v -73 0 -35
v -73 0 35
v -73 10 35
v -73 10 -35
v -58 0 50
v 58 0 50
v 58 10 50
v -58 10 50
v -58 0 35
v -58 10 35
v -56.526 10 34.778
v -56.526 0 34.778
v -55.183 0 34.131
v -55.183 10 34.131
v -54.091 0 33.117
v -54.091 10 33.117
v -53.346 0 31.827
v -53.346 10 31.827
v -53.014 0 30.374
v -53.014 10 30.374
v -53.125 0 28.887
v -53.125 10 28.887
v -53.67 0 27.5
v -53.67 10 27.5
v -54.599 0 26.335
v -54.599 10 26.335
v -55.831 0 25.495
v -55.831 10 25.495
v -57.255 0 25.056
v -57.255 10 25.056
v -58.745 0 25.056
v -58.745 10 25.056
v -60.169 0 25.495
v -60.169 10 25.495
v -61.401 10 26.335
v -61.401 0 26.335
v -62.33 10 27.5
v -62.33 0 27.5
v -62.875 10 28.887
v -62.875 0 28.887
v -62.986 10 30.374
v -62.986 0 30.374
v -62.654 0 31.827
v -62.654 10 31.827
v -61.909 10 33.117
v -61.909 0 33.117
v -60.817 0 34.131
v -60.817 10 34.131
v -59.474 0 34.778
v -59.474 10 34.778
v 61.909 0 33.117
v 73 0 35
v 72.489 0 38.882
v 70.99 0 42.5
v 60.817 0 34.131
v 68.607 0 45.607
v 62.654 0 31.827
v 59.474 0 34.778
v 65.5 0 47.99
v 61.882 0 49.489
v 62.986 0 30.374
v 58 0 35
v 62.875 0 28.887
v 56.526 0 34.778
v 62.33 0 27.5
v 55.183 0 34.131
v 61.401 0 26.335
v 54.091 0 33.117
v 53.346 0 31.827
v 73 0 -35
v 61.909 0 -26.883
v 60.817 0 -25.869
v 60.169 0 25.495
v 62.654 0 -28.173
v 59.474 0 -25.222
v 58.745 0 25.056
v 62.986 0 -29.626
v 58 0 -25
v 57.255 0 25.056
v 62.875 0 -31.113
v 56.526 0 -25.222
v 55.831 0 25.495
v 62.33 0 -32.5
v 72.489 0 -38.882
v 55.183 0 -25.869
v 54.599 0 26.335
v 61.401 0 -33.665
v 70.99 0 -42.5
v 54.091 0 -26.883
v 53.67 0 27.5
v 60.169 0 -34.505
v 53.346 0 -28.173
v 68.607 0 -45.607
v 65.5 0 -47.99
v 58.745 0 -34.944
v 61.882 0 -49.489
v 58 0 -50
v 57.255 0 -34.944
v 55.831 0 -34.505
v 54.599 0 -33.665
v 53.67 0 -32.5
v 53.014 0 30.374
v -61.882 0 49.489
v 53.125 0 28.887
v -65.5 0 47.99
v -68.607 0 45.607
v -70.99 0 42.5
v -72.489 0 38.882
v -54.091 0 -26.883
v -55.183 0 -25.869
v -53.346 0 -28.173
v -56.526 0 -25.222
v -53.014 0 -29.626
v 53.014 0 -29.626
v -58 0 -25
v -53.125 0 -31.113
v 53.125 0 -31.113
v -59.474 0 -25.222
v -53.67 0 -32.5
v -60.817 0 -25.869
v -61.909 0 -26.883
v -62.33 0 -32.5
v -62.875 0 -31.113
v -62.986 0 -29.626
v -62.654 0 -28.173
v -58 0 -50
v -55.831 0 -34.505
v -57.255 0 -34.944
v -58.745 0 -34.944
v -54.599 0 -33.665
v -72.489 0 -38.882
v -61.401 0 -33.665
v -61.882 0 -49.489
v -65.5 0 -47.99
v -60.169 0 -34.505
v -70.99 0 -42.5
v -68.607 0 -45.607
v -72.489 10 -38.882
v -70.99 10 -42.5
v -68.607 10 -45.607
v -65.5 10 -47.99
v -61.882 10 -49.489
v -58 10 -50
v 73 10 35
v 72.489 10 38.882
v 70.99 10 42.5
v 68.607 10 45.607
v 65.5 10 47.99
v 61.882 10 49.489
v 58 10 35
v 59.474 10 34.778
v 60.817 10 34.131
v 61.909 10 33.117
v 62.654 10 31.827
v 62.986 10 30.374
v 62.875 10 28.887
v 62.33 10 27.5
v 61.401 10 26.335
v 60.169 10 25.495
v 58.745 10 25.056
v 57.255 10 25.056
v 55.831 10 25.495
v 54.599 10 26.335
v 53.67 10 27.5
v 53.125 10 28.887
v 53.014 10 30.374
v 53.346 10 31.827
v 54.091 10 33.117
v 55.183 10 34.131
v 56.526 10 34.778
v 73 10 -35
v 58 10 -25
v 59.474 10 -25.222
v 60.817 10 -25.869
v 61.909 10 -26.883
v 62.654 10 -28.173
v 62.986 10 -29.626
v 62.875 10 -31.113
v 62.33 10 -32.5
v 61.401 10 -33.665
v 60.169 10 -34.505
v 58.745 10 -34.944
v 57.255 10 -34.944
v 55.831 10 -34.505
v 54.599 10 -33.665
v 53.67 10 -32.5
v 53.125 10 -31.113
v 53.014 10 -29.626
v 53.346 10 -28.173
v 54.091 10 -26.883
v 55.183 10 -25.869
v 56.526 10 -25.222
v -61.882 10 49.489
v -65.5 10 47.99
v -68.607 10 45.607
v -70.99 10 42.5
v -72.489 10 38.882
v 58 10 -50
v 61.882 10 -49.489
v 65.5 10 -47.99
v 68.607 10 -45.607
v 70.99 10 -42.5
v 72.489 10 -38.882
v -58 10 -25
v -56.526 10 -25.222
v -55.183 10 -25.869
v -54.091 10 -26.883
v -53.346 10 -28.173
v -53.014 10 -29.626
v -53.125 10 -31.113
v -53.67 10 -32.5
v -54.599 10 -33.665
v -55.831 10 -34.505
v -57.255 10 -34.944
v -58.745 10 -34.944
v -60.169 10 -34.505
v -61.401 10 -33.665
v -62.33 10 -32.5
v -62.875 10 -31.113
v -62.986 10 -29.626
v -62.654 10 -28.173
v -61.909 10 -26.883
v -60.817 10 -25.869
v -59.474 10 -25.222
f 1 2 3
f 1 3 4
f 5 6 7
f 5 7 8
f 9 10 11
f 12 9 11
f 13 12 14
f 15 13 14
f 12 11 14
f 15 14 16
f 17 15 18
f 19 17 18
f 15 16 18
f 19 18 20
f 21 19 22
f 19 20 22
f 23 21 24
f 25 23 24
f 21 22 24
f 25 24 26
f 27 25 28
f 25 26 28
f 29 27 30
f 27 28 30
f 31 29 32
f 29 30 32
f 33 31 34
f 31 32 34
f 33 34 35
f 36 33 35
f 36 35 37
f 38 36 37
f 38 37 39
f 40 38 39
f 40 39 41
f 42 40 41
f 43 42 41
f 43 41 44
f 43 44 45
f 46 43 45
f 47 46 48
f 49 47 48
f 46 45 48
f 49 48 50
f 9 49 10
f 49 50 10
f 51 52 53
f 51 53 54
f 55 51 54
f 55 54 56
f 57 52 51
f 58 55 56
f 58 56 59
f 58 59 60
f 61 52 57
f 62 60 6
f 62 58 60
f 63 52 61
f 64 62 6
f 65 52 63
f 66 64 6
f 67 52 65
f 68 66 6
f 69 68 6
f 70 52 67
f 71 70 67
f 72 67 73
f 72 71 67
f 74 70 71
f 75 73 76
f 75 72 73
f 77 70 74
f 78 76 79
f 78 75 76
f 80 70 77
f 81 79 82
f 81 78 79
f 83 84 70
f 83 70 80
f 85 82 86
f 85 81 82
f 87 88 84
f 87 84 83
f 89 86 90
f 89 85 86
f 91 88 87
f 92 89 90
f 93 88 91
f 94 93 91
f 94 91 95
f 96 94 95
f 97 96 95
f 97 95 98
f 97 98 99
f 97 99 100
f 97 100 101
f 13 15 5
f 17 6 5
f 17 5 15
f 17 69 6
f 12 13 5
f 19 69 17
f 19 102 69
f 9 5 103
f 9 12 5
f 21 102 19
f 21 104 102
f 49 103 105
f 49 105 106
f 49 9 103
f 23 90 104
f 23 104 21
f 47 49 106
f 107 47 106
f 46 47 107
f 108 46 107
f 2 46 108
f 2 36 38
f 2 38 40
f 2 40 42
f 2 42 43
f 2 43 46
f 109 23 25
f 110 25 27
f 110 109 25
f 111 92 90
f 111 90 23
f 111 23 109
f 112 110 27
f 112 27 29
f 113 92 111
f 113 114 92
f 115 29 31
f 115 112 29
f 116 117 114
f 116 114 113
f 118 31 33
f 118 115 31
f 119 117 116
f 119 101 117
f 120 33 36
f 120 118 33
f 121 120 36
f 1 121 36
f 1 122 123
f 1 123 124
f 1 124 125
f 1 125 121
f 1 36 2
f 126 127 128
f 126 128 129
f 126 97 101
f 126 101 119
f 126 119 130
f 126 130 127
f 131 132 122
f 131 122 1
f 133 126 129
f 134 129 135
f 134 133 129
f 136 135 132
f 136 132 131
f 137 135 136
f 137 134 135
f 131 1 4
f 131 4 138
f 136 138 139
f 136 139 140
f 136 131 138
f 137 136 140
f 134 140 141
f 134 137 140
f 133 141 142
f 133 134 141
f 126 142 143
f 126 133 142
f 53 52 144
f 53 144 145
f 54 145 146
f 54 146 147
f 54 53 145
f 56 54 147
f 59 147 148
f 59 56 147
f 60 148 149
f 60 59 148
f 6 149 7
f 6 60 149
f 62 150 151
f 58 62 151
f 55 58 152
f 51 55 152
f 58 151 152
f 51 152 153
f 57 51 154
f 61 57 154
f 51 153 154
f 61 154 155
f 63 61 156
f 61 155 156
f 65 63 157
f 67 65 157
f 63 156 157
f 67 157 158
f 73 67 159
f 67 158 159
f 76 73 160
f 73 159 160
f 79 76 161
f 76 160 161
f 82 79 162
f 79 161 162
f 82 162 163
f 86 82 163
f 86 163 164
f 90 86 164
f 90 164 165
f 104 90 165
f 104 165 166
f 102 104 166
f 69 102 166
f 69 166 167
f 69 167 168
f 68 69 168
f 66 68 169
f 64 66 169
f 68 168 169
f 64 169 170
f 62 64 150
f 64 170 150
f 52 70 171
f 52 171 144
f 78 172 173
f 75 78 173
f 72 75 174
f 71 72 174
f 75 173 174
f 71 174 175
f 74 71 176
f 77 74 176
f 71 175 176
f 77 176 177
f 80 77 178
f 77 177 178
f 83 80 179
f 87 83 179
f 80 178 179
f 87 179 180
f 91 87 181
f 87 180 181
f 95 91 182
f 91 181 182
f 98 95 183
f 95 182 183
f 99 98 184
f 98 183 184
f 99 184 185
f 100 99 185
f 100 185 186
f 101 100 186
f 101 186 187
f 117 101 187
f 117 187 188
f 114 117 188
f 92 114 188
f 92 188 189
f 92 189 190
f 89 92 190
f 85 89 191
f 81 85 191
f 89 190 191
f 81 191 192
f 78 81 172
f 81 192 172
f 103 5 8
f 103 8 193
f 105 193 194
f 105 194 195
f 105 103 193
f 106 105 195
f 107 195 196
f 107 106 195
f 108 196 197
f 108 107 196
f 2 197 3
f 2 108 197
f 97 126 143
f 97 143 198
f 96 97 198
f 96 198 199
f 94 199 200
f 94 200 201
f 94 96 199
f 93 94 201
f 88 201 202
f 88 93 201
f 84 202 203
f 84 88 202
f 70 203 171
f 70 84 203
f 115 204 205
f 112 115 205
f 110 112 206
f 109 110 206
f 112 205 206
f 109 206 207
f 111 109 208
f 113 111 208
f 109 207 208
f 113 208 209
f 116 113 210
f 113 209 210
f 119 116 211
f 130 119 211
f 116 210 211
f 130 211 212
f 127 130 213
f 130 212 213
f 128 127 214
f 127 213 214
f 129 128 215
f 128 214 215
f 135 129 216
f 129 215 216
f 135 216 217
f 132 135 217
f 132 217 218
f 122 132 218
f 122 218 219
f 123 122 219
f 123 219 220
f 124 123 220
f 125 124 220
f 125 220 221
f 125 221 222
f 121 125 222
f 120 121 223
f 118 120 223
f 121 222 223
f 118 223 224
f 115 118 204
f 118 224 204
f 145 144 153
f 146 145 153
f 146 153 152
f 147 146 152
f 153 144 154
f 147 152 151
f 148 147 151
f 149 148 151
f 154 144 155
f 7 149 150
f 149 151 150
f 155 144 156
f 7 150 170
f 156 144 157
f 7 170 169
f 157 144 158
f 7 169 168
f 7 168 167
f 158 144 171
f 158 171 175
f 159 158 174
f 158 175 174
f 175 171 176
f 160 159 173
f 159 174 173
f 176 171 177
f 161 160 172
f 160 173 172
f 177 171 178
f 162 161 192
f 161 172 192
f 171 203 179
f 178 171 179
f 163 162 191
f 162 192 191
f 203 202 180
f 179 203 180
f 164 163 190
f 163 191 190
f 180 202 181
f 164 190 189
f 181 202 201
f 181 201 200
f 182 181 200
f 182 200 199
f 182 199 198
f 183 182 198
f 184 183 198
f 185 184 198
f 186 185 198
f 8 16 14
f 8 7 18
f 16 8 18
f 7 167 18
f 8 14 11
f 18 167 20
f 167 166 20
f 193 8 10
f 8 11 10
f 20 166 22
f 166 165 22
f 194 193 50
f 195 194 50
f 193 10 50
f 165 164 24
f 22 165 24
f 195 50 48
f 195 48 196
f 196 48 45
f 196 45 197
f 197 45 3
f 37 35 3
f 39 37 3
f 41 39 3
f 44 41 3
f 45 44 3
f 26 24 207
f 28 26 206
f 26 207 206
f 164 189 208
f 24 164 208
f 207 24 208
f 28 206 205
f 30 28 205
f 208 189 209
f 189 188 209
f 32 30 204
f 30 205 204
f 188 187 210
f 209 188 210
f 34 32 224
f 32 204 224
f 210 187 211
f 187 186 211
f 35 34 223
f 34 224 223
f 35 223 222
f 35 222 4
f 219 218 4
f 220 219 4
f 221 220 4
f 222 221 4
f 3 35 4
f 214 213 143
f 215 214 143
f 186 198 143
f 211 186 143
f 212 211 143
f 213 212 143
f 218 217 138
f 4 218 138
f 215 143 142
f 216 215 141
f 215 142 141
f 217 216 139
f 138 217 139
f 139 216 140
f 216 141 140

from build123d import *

# Parameters (mm, degrees)
SALIENTE_EXTRUIR1_DEPTH  = 10
CROQUIS2_R               = 5
CORTAR_EXTRUIR1_DEPTH    = 10
MATRIZL1_COUNT           = 3
MATRIZL1_PITCH           = 116
MATRIZL2_COUNT           = 3
MATRIZL2_PITCH           = 60
MATRIZL2_COPY_1_SKETCH_R = 5
MATRIZL2_COPY_1_DEPTH    = 10
MATRIZL2_COPY_2_SKETCH_R = 5
MATRIZL2_COPY_2_DEPTH    = 10
MATRIZL2_COPY_3_SKETCH_R = 5
MATRIZL2_COPY_3_DEPTH    = 10
MATRIZL2_COPY_4_SKETCH_R = 5
MATRIZL2_COPY_4_DEPTH    = 10


with BuildPart() as part:
    # Croquis1 → Saliente-Extruir1 (new body)
    with BuildSketch(Plane(origin=(0, 0, 0), x_dir=(1, 0, 0), z_dir=(0, 1, 0))):
        with BuildLine():
            Line((58, -50), (-58, -50))
            ThreePointArc((-58, -50), (-68.606601718, -45.606601718), (-73, -35))
            Line((-73, -35), (-73, 35))
            ThreePointArc((-73, 35), (-68.606601718, 45.606601718), (-58, 50))
            Line((-58, 50), (58, 50))
            ThreePointArc((58, 50), (68.606601718, 45.606601718), (73, 35))
            Line((73, 35), (73, -35))
            ThreePointArc((73, -35), (68.606601718, -45.606601718), (58, -50))
        make_face()
    extrude(amount=SALIENTE_EXTRUIR1_DEPTH)

    # Croquis2 → Cortar-Extruir1 (cut)
    with BuildSketch(Plane(origin=(0, 10, 0), x_dir=(1, 0, 0), z_dir=(0, 1, 0))):
        with Locations(Location((-58, 30, 0), (0, 0, 270))):
            Circle(CROQUIS2_R)
    cortar_extruir1 = extrude(amount=-CORTAR_EXTRUIR1_DEPTH, mode=Mode.SUBTRACT)

    # MatrizL1: Cortar-Extruir1 ×3
    with Locations(*[(i * MATRIZL1_PITCH, 0, 0) for i in range(1, MATRIZL1_COUNT)]):
        add(cortar_extruir1, mode=Mode.SUBTRACT)

    # MatrizL2: Cortar-Extruir1 ×3
    with Locations(*[(0, 0, i * MATRIZL2_PITCH) for i in range(1, MATRIZL2_COUNT)]):
        add(cortar_extruir1, mode=Mode.SUBTRACT)

    # MatrizL2 copy 1 sketch → MatrizL2 copy 1 (cut)
    with BuildSketch(Plane(origin=(116, 10, 60), x_dir=(1, 0, 0), z_dir=(0, 1, 0))):
        with Locations(Location((-58, 30, 0), (0, 0, 270))):
            Circle(MATRIZL2_COPY_1_SKETCH_R)
    extrude(amount=-MATRIZL2_COPY_1_DEPTH, mode=Mode.SUBTRACT)

    # MatrizL2 copy 2 sketch → MatrizL2 copy 2 (cut)
    with BuildSketch(Plane(origin=(116, 10, 120), x_dir=(1, 0, 0), z_dir=(0, 1, 0))):
        with Locations(Location((-58, 30, 0), (0, 0, 270))):
            Circle(MATRIZL2_COPY_2_SKETCH_R)
    extrude(amount=-MATRIZL2_COPY_2_DEPTH, mode=Mode.SUBTRACT)

    # MatrizL2 copy 3 sketch → MatrizL2 copy 3 (cut)
    with BuildSketch(Plane(origin=(232, 10, 60), x_dir=(1, 0, 0), z_dir=(0, 1, 0))):
        with Locations(Location((-58, 30, 0), (0, 0, 270))):
            Circle(MATRIZL2_COPY_3_SKETCH_R)
    extrude(amount=-MATRIZL2_COPY_3_DEPTH, mode=Mode.SUBTRACT)

    # MatrizL2 copy 4 sketch → MatrizL2 copy 4 (cut)
    with BuildSketch(Plane(origin=(232, 10, 120), x_dir=(1, 0, 0), z_dir=(0, 1, 0))):
        with Locations(Location((-58, 30, 0), (0, 0, 270))):
            Circle(MATRIZL2_COPY_4_SKETCH_R)
    extrude(amount=-MATRIZL2_COPY_4_DEPTH, mode=Mode.SUBTRACT)


solid = part.part
